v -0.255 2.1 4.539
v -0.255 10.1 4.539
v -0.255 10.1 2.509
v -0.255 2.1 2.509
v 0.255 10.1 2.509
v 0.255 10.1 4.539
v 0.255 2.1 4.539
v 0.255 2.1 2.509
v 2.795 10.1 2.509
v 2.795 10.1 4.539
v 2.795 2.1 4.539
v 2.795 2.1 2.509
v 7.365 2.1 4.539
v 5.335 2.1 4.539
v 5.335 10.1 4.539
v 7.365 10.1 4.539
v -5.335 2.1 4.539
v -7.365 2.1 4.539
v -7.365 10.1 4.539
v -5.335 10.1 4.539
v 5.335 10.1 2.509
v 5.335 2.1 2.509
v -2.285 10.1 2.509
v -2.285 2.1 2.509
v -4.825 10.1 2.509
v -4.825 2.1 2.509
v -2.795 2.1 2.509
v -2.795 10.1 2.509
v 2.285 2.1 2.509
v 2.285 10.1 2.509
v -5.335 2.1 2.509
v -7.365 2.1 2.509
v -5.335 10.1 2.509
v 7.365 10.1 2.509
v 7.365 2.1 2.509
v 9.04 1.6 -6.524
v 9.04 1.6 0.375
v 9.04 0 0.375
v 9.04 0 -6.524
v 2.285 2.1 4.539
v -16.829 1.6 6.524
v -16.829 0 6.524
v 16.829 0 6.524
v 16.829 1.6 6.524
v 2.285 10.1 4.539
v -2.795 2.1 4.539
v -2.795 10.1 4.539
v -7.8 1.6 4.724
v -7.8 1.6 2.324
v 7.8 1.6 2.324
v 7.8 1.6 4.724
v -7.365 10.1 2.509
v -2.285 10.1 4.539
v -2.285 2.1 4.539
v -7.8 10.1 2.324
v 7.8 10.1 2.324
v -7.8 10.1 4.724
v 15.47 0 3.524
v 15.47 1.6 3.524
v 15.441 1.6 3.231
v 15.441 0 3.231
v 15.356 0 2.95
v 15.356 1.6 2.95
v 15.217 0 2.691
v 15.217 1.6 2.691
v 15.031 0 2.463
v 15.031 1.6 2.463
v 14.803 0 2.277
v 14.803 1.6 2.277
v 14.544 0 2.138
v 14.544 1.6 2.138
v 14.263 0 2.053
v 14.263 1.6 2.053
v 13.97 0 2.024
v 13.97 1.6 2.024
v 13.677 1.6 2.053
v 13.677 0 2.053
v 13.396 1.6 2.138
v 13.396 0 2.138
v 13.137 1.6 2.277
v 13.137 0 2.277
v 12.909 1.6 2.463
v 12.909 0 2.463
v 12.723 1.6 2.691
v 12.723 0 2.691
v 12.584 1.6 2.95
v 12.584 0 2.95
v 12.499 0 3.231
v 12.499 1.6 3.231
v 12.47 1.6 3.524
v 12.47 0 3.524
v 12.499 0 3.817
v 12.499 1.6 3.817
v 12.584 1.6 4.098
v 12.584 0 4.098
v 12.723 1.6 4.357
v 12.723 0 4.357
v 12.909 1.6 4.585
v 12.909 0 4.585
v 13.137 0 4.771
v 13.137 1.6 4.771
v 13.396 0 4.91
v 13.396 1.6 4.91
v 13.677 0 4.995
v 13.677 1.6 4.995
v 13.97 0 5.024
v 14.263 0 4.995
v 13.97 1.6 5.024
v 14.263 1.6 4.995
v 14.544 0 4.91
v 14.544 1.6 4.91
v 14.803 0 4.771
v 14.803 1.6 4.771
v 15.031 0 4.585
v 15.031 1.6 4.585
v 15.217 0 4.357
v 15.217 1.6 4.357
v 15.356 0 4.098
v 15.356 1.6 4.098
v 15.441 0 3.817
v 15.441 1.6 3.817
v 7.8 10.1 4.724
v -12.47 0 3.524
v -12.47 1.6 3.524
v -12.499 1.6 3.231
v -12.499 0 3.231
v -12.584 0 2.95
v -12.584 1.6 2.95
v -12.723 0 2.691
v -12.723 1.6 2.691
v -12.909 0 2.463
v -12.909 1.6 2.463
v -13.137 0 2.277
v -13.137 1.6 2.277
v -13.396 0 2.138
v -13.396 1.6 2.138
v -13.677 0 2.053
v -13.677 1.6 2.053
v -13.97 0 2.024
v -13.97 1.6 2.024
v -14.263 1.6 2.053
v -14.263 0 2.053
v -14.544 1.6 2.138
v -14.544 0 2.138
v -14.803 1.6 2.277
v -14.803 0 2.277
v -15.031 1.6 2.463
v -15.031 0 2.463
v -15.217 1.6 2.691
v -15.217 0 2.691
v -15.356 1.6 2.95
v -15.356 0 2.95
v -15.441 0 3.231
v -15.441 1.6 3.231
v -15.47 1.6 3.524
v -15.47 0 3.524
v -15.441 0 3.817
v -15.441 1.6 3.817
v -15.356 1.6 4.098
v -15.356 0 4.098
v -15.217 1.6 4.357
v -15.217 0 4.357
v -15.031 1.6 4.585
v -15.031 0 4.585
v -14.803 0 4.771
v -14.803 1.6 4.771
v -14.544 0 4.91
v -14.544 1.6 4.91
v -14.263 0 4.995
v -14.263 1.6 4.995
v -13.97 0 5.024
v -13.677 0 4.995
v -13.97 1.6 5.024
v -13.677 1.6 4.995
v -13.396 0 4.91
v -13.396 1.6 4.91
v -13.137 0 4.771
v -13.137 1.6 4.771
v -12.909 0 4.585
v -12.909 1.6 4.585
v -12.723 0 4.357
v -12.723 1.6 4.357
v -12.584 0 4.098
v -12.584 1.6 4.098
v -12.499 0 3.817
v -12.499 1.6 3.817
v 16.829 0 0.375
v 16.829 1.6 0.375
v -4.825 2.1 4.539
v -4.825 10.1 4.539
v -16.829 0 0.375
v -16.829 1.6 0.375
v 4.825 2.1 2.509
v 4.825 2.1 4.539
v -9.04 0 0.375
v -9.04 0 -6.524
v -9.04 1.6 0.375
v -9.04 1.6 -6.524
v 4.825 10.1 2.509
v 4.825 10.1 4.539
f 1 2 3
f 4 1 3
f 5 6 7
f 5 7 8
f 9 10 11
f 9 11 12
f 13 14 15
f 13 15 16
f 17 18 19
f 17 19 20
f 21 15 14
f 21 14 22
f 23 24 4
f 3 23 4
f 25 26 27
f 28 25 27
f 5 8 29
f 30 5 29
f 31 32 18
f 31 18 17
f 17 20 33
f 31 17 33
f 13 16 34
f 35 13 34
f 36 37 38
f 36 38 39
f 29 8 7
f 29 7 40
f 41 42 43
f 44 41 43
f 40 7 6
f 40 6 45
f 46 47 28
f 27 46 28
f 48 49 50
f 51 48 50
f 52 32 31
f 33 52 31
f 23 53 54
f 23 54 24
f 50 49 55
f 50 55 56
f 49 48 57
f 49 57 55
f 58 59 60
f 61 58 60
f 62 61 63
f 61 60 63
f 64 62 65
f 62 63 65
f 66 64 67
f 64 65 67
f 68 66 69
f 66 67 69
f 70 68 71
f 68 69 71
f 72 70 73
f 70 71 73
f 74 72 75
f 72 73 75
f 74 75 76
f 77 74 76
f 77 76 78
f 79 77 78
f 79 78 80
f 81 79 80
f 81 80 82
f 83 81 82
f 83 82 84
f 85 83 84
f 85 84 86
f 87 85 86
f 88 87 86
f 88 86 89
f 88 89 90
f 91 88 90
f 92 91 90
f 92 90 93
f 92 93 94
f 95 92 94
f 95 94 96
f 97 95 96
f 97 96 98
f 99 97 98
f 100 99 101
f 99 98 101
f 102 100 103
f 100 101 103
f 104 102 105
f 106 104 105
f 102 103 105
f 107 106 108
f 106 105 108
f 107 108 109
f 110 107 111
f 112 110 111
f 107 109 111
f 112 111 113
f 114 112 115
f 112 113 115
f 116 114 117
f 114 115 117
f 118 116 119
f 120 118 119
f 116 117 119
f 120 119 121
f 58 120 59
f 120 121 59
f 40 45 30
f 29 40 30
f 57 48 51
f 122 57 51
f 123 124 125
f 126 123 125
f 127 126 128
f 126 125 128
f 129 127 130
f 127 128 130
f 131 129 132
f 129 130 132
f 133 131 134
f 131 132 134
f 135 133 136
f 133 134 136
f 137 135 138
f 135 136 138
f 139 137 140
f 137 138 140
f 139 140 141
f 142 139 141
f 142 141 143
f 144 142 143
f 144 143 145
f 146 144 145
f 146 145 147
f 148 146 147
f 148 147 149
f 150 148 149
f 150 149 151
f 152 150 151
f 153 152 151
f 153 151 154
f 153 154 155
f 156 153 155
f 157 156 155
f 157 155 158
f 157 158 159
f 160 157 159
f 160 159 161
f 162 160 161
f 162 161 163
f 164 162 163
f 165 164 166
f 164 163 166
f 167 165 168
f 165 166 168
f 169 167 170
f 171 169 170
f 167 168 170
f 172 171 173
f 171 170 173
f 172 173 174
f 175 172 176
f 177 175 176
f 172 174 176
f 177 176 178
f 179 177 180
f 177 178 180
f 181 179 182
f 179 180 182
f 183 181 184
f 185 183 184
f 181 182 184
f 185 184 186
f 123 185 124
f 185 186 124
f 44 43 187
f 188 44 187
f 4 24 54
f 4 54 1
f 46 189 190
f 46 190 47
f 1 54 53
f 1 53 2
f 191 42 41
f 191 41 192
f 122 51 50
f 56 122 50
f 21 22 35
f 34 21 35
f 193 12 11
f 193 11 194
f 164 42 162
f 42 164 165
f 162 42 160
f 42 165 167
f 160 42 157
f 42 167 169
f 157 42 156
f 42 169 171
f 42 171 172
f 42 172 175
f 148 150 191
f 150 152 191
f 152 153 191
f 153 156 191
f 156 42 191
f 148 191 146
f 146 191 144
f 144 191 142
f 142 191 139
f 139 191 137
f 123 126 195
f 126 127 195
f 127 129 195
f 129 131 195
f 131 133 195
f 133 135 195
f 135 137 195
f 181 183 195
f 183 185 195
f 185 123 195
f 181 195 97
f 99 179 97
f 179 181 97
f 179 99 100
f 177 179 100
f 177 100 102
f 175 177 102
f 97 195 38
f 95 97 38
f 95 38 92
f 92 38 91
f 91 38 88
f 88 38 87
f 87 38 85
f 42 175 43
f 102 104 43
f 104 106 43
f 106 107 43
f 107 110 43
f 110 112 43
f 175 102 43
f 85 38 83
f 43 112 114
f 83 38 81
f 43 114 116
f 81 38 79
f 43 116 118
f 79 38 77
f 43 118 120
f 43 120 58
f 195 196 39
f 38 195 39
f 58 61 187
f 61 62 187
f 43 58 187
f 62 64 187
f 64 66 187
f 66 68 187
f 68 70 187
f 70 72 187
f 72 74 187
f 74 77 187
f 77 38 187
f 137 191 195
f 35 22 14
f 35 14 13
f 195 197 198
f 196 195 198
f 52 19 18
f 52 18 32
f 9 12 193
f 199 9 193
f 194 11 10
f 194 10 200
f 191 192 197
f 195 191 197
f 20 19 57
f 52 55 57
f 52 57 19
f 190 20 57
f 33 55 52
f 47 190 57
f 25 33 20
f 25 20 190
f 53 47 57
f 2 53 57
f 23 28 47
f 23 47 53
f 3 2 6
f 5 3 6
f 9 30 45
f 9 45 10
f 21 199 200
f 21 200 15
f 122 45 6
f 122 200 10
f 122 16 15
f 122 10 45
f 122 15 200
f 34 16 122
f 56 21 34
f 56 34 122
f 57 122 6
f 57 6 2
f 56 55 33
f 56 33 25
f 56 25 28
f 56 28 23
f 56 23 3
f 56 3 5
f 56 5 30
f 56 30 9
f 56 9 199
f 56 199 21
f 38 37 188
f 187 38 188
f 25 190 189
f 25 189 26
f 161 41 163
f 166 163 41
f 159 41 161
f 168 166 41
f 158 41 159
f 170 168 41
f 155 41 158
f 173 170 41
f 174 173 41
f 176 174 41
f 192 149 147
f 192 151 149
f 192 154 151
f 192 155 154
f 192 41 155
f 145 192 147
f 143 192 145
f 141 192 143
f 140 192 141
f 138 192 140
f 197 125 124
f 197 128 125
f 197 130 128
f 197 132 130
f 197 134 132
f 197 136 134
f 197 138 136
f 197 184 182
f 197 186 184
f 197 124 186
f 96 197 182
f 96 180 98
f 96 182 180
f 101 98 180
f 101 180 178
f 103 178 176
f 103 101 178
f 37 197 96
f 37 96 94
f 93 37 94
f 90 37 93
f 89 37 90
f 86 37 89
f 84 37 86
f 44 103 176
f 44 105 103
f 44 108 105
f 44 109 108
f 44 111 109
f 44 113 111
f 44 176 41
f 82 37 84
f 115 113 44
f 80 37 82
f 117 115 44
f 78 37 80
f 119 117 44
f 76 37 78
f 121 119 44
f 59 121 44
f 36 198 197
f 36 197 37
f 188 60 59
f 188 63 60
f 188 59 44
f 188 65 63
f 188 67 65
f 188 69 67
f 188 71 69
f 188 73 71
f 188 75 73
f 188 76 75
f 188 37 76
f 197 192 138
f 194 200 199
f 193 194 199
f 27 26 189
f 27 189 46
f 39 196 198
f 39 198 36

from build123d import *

# Parameters (mm, degrees)
SKETCH1_W           = 33.657442538
SKETCH1_H           = 13.047800822
BOSS_EXTRUDE1_DEPTH = 1.6
SKETCH2_W           = 15.6
SKETCH2_H           = 2.4
BOSS_EXTRUDE2_DEPTH = 8.5
SKETCH2_3_R         = 1.5
CUT_EXTRUDE2_DEPTH  = 2.6
SKETCH3_W           = 2.030267254
SKETCH3_H           = 2.030267255
CUT_EXTRUDE1_DEPTH  = 8
SKETCH4_W           = 7.788757613
SKETCH4_H           = 6.899262224
CUT_EXTRUDE3_DEPTH  = 2.6


with BuildPart() as part:
    # Sketch1 → Boss-Extrude1 (new body)
    with BuildSketch(Plane(origin=(0, 0, 0), x_dir=(1, 0, 0), z_dir=(0, 1, 0))):
        Rectangle(SKETCH1_W, SKETCH1_H)
    extrude(amount=BOSS_EXTRUDE1_DEPTH)

    # Sketch2<3> → Cut-Extrude2 (cut, through all)
    with BuildSketch(Plane(origin=(0, 1.6, 0), x_dir=(1, 0, 0), z_dir=(0, 1, 0))):
        with Locations((-13.97, -3.523900411)):
            Circle(SKETCH2_3_R)
        with Locations((13.97, -3.523900411)):
            Circle(SKETCH2_3_R)
    extrude(amount=-CUT_EXTRUDE2_DEPTH, mode=Mode.SUBTRACT)

    # Sketch4 → Cut-Extrude3 (cut, through all)
    with BuildSketch(Plane(origin=(0, 1.6, 0), x_dir=(1, 0, 0), z_dir=(0, 1, 0))):
        with Locations((-12.934342463, 3.074269299)):
            Rectangle(SKETCH4_W, SKETCH4_H)
        with Locations((12.934342463, 3.074269299)):
            Rectangle(SKETCH4_W, SKETCH4_H)
    extrude(amount=-CUT_EXTRUDE3_DEPTH, mode=Mode.SUBTRACT)


with BuildPart() as body_2:
    # Sketch2 → Boss-Extrude2 (new body)
    with BuildSketch(Plane(origin=(0, 1.6, 0), x_dir=(1, 0, 0), z_dir=(0, 1, 0))):
        with Locations((0, -3.523900411)):
            Rectangle(SKETCH2_W, SKETCH2_H)
    extrude(amount=BOSS_EXTRUDE2_DEPTH)

    # Sketch3 → Cut-Extrude1 (cut)
    with BuildSketch(Plane(origin=(0, 10.1, 0), x_dir=(1, 0, 0), z_dir=(0, 1, 0))):
        with Locations((-3.81, -3.523900412)):
            Rectangle(SKETCH3_W, SKETCH3_H)
        with Locations((-6.35, -3.523900412)):
            Rectangle(SKETCH3_W, SKETCH3_H)
        with Locations((-1.27, -3.523900412)):
            Rectangle(SKETCH3_W, SKETCH3_H)
        with Locations((1.27, -3.523900412)):
            Rectangle(SKETCH3_W, SKETCH3_H)
        with Locations((3.81, -3.523900412)):
            Rectangle(SKETCH3_W, SKETCH3_H)
        with Locations((6.35, -3.523900412)):
            Rectangle(SKETCH3_W, SKETCH3_H)
    extrude(amount=-CUT_EXTRUDE1_DEPTH, mode=Mode.SUBTRACT)


solid = Compound([part.part, body_2.part])
